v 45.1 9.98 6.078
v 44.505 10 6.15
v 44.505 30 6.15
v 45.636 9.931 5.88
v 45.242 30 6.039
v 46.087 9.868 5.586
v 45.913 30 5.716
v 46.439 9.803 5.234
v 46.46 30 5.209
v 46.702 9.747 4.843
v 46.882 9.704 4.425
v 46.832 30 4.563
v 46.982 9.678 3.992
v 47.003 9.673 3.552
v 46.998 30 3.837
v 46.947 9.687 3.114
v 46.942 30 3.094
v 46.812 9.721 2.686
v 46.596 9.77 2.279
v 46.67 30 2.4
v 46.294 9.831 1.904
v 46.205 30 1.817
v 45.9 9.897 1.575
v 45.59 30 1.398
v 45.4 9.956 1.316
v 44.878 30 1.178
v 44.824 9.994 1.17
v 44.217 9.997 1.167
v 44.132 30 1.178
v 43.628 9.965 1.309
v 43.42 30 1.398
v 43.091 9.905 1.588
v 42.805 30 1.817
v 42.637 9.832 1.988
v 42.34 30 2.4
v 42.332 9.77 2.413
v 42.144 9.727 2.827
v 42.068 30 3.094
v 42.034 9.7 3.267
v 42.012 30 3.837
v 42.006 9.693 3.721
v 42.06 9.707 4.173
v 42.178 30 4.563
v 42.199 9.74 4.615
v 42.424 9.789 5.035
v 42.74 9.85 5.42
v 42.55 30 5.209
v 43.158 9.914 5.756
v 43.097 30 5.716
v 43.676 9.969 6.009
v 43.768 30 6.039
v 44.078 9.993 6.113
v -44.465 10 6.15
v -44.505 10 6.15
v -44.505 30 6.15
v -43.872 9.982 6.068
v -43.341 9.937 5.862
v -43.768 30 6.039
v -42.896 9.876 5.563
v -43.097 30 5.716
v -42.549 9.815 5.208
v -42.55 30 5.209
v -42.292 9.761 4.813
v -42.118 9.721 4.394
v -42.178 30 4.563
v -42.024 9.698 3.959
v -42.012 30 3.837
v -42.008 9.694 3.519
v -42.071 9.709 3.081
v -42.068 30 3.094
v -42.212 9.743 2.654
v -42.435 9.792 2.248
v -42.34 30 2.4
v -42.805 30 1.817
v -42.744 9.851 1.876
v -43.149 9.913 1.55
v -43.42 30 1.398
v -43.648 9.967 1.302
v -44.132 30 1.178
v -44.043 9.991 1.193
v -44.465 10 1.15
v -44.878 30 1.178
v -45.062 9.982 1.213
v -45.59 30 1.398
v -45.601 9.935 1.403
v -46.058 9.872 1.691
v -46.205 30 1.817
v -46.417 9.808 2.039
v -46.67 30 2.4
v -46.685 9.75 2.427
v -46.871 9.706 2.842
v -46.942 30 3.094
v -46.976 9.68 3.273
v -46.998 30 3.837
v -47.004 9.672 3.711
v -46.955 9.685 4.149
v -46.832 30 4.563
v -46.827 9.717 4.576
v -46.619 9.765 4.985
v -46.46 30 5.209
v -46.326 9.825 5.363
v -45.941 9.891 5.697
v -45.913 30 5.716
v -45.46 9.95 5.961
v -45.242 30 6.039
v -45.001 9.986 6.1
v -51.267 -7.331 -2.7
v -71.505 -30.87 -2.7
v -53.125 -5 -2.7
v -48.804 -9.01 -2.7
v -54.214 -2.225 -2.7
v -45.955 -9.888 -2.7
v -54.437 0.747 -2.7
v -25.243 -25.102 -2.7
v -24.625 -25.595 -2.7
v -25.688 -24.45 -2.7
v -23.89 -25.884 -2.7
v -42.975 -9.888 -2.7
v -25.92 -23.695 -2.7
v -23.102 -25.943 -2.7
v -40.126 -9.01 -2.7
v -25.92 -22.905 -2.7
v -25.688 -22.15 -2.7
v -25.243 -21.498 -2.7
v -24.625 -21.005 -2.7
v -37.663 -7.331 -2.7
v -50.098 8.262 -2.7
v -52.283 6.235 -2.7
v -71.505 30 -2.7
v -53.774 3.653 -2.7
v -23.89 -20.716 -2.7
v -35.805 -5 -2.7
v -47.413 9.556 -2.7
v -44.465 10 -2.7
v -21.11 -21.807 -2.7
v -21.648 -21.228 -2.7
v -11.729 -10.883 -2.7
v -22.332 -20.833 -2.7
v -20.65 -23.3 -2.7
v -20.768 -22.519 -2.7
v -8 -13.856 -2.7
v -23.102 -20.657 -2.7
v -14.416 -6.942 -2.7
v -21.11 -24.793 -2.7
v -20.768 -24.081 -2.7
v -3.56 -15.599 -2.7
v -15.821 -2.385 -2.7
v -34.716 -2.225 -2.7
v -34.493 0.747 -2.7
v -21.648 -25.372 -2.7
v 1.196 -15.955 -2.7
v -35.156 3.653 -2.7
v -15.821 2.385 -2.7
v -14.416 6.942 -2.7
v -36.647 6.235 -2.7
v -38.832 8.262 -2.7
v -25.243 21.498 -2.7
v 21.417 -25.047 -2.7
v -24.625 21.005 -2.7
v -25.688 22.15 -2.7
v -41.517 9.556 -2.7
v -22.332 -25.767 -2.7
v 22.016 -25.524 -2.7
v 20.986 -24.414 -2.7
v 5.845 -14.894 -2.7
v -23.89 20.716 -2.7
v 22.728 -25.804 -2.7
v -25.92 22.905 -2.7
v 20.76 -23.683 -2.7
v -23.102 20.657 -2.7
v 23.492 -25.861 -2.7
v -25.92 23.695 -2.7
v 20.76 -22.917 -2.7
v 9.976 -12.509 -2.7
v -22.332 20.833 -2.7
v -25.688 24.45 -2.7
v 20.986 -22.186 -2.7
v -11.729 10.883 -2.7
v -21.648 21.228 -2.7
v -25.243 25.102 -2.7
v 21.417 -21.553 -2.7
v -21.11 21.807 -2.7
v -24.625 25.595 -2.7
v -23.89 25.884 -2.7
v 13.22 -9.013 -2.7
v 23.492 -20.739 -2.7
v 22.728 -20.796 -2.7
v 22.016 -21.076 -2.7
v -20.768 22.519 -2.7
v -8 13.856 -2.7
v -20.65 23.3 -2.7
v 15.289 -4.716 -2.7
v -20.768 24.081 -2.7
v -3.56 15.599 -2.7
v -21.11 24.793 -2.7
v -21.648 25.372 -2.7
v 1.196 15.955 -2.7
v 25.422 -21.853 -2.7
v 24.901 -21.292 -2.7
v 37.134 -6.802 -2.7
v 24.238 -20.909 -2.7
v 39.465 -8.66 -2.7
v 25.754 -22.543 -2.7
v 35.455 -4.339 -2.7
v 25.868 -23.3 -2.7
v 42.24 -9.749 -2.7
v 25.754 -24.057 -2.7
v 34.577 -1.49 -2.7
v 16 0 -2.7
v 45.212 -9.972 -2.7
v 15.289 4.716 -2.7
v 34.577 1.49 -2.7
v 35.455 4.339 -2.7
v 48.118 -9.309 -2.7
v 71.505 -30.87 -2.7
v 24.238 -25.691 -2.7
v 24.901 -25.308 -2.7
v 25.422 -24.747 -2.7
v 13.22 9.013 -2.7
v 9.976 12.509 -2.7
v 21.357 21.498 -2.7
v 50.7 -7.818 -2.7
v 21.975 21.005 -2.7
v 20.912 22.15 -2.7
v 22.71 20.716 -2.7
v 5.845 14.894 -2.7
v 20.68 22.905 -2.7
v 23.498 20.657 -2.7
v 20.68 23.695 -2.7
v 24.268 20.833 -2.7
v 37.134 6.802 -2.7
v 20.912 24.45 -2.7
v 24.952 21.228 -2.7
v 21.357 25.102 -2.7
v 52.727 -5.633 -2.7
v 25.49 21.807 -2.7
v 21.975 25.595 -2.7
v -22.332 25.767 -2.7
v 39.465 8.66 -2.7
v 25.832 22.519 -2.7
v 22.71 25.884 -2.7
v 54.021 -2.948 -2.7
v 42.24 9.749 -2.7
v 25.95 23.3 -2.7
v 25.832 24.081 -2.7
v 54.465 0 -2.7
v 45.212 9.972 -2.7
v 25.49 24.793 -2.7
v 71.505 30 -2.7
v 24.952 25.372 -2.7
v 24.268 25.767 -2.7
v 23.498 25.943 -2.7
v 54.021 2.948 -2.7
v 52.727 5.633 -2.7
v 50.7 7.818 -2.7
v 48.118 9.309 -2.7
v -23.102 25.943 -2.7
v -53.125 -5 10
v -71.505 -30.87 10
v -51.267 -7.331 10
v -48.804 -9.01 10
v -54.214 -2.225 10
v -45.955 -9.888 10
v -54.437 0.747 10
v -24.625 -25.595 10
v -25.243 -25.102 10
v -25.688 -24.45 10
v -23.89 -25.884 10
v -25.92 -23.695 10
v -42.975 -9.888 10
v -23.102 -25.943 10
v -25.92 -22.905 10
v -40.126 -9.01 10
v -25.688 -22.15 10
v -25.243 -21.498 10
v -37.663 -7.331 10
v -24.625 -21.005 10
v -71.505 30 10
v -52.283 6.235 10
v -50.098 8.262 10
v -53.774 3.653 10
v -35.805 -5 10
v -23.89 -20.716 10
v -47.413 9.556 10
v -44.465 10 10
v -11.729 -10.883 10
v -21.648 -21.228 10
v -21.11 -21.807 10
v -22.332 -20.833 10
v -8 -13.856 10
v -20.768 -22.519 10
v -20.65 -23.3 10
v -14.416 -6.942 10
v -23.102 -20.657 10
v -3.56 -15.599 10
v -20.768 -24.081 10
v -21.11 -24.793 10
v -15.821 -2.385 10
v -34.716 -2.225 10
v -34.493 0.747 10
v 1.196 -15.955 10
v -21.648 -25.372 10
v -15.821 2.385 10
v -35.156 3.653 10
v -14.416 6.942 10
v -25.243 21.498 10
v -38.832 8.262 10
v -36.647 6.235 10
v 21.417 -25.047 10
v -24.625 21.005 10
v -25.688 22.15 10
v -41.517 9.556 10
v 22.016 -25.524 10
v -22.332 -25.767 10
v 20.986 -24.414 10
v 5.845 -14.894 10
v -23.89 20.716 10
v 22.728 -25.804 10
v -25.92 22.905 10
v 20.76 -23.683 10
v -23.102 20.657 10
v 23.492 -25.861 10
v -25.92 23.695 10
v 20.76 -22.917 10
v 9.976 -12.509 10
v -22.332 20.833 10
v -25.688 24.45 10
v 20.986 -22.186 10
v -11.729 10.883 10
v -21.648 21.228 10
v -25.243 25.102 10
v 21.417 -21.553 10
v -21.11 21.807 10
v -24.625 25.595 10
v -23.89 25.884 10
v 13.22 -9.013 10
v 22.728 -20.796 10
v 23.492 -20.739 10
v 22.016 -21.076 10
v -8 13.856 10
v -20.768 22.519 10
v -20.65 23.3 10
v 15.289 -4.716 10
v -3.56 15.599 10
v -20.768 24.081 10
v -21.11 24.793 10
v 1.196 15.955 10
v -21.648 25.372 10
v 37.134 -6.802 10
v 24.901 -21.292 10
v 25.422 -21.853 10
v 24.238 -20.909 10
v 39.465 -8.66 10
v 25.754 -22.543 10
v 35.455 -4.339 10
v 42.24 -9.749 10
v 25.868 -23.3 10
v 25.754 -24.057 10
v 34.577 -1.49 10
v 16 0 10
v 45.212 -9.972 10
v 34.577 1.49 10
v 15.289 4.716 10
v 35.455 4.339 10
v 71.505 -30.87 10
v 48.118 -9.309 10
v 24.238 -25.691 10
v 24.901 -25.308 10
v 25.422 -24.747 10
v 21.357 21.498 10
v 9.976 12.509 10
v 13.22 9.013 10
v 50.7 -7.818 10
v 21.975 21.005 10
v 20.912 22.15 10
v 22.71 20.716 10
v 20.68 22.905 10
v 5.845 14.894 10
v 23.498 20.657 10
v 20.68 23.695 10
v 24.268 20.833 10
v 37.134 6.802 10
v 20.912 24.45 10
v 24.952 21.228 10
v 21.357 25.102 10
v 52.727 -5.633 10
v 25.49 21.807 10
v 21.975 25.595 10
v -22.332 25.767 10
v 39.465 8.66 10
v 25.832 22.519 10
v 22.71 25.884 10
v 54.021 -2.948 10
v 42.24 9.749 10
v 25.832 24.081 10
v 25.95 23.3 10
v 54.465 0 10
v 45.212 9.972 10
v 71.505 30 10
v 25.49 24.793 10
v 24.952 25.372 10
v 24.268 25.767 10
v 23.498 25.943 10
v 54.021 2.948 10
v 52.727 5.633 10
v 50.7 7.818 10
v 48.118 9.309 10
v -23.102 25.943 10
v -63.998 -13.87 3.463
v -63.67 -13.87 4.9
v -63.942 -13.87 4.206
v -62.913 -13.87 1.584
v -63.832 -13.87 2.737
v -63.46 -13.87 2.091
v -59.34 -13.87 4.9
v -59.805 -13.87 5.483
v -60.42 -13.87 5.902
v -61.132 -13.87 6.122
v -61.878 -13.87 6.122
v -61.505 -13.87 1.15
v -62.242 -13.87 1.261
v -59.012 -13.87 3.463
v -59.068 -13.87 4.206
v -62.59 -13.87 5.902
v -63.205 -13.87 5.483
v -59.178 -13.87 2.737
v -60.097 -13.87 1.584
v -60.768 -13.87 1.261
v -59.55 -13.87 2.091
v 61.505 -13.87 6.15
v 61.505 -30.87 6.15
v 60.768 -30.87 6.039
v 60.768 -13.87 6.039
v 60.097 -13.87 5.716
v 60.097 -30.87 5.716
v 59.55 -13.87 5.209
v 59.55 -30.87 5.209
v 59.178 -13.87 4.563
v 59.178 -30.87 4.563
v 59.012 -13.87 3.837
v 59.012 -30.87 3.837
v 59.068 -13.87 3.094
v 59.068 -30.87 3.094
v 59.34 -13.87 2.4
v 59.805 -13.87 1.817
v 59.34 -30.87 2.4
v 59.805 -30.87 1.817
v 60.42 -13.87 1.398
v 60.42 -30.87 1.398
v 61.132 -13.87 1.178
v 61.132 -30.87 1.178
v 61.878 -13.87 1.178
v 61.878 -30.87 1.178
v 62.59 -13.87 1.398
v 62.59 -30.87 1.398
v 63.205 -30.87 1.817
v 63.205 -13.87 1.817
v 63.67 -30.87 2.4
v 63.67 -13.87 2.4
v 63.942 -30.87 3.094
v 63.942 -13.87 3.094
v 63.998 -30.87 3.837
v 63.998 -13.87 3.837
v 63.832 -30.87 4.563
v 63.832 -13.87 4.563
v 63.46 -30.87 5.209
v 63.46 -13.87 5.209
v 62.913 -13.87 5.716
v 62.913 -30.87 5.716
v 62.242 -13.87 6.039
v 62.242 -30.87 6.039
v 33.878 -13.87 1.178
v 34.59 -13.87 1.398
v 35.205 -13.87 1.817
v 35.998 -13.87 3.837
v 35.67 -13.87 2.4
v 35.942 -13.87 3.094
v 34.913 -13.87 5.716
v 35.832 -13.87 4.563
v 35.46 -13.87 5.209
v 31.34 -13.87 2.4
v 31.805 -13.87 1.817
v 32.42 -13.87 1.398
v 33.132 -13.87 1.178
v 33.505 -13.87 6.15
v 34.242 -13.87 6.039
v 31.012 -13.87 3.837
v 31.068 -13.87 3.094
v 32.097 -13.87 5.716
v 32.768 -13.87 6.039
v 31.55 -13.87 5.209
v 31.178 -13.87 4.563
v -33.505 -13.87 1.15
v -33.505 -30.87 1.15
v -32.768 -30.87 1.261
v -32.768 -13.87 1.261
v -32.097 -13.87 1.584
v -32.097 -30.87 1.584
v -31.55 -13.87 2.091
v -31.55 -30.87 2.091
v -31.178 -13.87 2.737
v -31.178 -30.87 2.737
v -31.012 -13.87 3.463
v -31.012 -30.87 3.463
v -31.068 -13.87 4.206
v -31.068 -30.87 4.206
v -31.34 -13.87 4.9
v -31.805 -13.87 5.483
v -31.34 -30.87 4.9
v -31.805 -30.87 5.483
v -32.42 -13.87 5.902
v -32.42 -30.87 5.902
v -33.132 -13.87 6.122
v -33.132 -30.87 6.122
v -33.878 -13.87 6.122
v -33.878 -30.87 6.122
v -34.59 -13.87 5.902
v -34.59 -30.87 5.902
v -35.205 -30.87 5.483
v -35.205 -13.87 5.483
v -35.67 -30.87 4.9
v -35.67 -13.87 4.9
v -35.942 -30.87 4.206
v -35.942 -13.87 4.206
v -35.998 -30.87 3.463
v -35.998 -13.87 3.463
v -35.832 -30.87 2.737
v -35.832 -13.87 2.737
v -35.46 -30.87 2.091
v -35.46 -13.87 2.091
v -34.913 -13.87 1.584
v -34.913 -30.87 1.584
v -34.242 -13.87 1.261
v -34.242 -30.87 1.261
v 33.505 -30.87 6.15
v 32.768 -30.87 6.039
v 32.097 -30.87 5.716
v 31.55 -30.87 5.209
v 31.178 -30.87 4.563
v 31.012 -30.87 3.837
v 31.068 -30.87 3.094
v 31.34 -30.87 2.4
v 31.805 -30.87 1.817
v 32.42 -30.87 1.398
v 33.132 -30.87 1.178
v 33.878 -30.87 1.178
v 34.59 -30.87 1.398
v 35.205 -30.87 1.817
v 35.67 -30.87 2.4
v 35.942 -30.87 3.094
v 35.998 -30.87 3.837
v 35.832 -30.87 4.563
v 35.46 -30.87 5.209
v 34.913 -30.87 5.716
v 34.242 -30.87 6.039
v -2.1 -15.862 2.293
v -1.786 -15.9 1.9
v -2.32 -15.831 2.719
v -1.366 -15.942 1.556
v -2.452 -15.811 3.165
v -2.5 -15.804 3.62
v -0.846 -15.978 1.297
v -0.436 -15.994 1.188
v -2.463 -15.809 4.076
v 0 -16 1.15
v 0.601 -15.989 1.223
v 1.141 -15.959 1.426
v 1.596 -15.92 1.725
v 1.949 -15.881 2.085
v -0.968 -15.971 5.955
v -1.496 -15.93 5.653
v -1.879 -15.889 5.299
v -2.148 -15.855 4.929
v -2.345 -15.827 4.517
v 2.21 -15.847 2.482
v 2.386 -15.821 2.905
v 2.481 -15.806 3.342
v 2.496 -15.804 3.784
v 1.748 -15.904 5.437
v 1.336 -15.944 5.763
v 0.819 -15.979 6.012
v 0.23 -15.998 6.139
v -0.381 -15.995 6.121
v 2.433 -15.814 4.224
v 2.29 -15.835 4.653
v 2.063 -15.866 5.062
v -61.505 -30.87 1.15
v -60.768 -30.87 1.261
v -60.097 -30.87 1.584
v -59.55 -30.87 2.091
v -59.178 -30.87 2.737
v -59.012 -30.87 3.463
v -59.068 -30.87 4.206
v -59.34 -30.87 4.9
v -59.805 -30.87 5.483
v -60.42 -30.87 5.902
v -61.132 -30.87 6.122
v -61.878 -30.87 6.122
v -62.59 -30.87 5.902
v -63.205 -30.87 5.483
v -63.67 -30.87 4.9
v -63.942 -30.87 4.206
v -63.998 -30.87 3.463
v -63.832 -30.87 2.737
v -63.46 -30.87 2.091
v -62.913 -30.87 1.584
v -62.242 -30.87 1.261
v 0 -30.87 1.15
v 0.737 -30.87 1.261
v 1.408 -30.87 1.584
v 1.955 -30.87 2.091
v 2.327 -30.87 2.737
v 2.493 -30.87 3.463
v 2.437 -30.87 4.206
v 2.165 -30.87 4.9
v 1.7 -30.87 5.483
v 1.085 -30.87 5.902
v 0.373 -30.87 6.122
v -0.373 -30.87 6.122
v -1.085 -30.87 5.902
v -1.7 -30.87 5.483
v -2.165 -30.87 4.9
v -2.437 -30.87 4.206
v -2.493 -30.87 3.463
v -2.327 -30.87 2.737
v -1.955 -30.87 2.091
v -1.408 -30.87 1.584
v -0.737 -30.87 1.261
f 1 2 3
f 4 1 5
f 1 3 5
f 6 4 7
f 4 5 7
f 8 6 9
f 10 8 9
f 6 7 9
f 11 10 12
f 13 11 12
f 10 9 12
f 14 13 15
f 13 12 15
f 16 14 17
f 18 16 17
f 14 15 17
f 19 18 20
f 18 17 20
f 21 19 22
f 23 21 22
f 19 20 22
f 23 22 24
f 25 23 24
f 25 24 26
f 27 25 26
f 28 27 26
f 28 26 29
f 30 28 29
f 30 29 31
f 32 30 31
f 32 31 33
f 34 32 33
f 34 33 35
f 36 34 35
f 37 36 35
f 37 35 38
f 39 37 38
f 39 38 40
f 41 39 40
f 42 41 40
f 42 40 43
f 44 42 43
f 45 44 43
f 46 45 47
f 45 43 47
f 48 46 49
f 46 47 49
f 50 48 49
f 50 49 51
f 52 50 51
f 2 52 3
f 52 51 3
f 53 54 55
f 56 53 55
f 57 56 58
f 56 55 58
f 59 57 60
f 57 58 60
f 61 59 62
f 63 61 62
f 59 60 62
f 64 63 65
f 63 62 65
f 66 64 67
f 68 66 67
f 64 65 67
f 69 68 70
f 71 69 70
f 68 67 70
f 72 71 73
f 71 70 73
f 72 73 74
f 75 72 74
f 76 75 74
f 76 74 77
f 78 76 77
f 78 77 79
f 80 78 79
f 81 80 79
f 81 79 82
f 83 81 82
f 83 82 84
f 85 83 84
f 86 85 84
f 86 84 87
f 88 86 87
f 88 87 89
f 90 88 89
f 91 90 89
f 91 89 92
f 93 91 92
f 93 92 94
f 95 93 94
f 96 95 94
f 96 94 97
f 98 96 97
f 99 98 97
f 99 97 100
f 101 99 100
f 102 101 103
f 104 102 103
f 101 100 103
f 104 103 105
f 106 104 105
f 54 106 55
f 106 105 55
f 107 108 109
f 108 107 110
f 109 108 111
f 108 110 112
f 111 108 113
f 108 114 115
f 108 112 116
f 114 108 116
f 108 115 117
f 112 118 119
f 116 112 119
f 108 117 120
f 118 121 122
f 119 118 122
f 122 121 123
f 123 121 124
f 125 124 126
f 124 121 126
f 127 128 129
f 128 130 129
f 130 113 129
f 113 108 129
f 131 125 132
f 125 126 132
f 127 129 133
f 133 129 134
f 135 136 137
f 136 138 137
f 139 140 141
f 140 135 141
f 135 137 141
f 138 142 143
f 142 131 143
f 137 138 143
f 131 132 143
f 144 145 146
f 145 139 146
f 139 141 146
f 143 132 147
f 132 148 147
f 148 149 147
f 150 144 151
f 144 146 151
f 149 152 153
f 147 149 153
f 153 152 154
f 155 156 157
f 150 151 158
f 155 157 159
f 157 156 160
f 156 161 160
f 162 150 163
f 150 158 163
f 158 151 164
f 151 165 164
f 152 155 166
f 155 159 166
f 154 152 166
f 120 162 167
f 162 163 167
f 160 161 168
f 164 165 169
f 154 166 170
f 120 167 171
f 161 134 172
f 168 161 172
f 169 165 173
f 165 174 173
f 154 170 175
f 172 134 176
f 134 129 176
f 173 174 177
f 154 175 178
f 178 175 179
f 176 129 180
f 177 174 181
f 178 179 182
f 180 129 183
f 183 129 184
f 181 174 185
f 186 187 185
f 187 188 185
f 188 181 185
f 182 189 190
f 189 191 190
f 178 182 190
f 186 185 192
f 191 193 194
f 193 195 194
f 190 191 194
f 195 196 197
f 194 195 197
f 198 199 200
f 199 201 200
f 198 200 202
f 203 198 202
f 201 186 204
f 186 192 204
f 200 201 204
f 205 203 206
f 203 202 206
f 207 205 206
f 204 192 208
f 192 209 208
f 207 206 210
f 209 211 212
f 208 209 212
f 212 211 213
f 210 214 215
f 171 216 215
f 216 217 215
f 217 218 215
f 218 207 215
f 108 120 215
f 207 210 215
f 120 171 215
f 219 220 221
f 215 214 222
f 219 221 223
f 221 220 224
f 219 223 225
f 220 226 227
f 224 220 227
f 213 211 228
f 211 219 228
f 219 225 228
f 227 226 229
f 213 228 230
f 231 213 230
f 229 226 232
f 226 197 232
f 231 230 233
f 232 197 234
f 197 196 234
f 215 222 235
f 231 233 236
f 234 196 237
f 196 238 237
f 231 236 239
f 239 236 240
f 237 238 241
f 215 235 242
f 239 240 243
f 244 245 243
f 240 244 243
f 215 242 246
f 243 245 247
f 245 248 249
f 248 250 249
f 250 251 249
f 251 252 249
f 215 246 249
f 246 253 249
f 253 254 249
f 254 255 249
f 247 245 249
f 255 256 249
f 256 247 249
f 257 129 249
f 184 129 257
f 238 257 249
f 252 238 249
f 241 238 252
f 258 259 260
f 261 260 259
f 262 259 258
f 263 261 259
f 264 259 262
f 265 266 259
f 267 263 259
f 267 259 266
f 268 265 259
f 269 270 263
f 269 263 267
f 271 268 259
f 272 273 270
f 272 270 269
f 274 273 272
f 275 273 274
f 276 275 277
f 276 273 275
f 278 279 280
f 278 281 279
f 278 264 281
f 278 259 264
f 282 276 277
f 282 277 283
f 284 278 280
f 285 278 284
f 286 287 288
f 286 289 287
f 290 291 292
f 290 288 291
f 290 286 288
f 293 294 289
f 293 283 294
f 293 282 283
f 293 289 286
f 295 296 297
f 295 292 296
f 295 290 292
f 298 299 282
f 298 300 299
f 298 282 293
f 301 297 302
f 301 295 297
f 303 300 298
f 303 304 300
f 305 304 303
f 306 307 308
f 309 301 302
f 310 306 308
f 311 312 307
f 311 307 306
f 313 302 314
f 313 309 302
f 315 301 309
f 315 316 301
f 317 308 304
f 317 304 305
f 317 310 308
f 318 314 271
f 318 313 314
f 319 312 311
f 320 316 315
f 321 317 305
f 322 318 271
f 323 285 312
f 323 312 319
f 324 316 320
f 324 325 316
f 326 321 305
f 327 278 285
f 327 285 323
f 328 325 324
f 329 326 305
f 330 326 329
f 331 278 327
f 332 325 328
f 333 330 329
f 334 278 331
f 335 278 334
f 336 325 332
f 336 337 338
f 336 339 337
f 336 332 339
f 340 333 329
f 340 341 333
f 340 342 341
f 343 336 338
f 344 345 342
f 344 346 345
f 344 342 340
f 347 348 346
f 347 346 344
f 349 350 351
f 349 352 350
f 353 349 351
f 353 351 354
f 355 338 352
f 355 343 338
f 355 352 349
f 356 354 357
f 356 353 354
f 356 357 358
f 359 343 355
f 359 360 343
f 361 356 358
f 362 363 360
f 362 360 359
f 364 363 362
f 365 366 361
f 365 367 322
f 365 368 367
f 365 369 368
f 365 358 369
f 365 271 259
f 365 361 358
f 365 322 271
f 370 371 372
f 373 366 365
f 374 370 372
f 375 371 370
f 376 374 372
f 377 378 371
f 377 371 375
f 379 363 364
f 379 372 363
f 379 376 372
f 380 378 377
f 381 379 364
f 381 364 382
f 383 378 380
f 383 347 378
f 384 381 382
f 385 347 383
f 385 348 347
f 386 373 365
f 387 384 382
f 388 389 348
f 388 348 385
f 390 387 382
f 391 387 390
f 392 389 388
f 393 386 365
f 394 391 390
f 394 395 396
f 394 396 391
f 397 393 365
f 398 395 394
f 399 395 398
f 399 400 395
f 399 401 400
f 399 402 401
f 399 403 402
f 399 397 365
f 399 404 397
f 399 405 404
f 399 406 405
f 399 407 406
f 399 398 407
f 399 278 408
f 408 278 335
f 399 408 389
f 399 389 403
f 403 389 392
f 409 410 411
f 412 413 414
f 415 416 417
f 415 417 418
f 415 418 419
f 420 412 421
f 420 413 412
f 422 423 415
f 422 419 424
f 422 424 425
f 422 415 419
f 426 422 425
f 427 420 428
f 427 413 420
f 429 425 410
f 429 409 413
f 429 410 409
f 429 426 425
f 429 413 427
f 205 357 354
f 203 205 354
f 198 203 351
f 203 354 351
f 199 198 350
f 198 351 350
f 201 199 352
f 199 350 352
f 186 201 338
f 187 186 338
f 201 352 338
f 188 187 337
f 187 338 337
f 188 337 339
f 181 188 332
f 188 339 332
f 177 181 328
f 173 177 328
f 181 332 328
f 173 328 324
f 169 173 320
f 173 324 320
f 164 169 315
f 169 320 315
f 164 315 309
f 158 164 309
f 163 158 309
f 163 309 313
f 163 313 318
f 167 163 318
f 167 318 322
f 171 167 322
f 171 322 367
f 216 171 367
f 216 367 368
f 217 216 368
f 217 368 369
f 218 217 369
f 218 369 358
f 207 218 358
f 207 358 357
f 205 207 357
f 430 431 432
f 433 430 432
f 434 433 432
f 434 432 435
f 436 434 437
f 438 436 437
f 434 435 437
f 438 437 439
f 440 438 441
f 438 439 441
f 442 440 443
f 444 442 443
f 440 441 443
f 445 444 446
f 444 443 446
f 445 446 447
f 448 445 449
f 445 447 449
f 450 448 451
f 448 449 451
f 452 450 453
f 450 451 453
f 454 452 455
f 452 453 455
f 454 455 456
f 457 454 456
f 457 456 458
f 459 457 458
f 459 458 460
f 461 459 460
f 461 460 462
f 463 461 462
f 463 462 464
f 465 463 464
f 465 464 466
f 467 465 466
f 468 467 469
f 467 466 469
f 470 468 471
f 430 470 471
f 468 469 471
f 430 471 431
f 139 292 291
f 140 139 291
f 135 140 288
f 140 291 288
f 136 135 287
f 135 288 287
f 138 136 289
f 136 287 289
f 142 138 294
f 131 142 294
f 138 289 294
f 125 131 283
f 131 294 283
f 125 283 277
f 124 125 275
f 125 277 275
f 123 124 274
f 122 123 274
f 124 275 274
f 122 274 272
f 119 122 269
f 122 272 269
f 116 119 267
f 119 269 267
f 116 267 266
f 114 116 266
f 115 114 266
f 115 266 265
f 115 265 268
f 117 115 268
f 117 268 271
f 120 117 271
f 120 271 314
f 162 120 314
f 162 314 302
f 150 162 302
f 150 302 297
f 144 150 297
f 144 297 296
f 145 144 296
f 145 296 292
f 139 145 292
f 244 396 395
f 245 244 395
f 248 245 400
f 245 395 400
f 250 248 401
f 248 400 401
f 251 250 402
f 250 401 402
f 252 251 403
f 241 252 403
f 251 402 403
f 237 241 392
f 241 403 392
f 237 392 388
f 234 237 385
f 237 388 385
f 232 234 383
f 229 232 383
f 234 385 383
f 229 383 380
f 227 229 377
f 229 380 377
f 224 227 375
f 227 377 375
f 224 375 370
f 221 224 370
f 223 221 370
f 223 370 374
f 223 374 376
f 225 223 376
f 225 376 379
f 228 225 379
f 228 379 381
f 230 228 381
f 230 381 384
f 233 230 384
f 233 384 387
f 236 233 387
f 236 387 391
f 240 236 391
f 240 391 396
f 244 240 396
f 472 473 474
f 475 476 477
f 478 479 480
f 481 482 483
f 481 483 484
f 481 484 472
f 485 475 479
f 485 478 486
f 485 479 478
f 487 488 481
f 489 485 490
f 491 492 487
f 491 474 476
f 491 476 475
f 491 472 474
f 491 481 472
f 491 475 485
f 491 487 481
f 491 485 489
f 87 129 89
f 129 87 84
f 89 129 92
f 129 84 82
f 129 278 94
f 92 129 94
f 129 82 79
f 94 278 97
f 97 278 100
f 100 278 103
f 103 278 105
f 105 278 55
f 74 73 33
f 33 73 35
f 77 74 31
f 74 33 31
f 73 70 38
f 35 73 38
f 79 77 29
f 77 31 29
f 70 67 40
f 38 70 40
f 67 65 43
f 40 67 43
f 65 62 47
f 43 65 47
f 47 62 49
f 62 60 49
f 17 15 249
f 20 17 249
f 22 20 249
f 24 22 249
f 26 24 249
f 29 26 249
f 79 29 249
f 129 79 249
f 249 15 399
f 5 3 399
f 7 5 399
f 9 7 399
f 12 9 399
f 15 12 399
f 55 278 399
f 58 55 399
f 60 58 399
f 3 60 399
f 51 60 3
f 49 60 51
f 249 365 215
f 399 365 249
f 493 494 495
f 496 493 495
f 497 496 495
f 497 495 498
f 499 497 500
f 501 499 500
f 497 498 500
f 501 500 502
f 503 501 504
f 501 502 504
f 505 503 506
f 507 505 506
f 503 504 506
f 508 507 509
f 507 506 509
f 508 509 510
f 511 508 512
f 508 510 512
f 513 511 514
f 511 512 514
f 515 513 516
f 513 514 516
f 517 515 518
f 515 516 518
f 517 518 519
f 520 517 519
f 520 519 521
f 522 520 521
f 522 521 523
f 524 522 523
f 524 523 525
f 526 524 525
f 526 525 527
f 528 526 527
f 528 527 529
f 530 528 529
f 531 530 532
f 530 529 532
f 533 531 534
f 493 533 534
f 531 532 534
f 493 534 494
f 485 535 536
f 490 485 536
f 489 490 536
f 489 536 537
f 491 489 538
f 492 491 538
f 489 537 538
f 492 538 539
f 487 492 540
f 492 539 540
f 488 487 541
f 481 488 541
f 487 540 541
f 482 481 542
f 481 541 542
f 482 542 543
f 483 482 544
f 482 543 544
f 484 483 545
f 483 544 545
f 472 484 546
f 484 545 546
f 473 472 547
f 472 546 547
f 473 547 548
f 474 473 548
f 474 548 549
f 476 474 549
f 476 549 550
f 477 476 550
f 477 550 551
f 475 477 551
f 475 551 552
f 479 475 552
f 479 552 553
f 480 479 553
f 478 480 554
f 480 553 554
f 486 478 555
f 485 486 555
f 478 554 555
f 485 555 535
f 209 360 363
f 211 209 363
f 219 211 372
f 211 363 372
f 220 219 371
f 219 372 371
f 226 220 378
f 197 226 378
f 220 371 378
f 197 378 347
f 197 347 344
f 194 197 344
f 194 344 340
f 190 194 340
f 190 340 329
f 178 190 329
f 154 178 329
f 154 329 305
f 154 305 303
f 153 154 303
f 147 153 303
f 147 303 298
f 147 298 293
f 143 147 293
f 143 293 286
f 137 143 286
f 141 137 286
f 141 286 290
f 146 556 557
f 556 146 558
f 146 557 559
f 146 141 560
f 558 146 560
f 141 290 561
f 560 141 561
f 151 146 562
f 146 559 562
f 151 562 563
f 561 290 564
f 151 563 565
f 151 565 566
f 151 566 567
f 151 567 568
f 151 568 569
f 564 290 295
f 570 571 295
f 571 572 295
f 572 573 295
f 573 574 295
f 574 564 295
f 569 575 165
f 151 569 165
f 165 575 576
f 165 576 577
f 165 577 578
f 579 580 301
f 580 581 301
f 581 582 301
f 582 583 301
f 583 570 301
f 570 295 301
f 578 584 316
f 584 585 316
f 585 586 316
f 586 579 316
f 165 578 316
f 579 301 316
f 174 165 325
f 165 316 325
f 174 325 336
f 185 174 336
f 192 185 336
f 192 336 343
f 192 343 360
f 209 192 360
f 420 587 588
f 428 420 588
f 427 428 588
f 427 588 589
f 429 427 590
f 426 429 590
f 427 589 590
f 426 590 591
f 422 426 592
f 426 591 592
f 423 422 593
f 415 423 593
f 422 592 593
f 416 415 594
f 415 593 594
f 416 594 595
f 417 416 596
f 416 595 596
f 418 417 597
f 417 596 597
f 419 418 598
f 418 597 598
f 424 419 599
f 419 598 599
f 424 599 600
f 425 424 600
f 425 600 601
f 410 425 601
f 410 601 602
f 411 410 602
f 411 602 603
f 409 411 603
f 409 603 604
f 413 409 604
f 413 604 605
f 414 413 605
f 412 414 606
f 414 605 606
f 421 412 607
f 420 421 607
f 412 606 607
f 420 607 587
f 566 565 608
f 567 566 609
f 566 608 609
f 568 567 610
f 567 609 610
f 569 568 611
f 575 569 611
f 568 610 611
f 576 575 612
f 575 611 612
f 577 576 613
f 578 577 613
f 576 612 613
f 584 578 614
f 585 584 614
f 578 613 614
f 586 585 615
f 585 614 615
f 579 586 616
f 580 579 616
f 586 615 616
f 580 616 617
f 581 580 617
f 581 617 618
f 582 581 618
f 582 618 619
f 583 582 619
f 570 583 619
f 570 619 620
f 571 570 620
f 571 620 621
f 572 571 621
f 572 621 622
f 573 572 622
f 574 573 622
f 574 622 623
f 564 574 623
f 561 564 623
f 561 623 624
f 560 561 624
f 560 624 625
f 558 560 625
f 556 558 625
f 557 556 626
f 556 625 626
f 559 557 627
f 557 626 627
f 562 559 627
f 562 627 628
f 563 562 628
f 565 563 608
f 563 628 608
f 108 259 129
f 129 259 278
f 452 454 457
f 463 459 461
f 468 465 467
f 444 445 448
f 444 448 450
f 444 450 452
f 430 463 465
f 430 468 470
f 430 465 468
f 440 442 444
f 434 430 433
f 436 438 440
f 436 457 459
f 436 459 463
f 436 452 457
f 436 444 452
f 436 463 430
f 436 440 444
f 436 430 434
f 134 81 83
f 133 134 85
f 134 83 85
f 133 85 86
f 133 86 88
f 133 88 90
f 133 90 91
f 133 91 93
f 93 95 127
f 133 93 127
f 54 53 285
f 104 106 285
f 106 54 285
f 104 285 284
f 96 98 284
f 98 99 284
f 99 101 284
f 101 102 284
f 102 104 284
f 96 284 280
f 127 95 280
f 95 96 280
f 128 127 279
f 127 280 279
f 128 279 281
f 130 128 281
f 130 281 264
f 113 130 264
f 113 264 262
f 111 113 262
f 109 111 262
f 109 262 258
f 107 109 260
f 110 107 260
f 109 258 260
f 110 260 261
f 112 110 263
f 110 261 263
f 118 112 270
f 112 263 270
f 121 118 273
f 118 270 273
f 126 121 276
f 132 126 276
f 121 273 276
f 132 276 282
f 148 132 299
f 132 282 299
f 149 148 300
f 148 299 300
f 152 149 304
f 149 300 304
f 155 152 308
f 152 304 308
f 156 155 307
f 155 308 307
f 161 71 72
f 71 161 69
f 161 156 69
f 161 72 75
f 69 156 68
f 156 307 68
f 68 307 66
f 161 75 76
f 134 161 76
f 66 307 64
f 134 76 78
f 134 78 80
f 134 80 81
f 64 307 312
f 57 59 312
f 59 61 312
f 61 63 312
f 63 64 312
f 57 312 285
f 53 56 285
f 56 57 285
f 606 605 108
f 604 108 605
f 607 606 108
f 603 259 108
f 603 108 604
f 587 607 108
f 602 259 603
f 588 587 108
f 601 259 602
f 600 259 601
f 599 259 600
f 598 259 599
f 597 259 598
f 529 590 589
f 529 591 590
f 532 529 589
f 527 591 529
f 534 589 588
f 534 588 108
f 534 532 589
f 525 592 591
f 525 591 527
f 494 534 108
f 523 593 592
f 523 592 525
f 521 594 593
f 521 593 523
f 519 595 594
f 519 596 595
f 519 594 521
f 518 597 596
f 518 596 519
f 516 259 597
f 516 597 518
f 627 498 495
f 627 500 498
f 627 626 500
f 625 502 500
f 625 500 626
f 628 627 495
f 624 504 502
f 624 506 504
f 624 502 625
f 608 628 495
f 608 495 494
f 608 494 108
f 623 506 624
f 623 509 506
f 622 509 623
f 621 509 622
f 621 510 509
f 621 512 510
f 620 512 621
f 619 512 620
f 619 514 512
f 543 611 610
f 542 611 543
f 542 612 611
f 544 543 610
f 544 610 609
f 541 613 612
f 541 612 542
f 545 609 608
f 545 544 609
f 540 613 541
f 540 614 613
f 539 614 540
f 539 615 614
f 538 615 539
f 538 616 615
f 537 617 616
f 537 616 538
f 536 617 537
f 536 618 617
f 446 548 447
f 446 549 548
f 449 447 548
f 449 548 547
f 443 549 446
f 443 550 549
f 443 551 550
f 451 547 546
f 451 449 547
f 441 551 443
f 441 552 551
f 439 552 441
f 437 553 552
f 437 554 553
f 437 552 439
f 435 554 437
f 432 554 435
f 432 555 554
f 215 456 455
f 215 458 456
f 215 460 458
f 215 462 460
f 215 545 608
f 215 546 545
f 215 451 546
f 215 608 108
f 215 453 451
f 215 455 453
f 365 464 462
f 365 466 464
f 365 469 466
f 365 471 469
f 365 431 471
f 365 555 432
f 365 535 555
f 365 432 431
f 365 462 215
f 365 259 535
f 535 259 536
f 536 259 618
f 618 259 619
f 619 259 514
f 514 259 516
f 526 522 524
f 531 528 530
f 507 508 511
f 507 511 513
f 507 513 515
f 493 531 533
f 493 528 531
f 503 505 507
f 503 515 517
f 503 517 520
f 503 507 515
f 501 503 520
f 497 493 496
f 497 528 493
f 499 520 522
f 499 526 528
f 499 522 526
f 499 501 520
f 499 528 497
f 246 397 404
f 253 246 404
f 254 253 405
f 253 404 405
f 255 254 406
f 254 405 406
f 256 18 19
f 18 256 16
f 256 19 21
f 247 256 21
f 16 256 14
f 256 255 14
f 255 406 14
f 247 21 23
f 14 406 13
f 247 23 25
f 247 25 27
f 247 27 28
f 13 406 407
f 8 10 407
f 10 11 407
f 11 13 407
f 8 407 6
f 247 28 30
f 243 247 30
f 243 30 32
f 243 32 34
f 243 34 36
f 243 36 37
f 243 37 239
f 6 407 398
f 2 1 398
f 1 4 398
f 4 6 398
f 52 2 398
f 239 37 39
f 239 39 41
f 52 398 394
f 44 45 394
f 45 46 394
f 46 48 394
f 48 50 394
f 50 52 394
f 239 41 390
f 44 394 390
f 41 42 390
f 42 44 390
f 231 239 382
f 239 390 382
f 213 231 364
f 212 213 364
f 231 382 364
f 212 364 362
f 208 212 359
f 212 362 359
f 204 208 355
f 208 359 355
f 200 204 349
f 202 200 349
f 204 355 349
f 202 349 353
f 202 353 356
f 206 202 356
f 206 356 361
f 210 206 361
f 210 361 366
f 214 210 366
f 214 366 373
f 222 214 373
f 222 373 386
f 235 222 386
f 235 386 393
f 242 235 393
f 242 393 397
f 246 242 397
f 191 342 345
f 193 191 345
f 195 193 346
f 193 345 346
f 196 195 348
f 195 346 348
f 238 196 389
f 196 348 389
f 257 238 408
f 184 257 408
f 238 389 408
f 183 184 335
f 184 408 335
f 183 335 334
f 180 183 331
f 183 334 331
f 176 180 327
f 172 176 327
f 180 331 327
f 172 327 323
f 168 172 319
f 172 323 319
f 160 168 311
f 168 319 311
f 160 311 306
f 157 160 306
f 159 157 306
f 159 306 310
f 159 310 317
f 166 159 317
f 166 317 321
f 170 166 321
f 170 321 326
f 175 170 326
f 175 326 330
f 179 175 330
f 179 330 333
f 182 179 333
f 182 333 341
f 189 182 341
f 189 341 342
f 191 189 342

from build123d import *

# Parameters (mm, degrees)
ESBO_O1_W                = 143.01
ESBO_O1_H                = 54
RESSALTO_EXTRUS_O1_DEPTH = 10
ESBO_O14_W               = 2.7
ESBO_O14_H               = 57.87
RESSALTO_EXTRUS_O3_DEPTH = 143.01
ESBO_O2_R                = 16
CIRCULO_ROLAMENTO_DEPTH  = 19
ESBO_O7_R                = 10
CORTE_EXTRUS_O3_DEPTH    = 19
ESBO_O8_W                = 143.01
ESBO_O8_H                = 3.87
RESSALTO_EXTRUS_O2_DEPTH = 10
ESBO_O22_W               = 143.01
ESBO_O22_H               = 3
RESSALTO_EXTRUS_O4_DEPTH = 12.7
ESBO_O12_R               = 2.5
CORTE_EXTRUS_O6_DEPTH    = 17
CORTE_EXTRUS_O15_REACH   = 80.913
ESBO_O9_R                = 2.568489929
ESBO_O9_R_2              = 2.65
CORTE_EXTRUS_O16_REACH   = 96.436
ESBO_O23_R               = 2.5


with BuildPart() as part:
    # Esboço1 → Ressalto-extrusão1 (new body)
    with BuildSketch(Plane.XY):
        Rectangle(ESBO_O1_W, ESBO_O1_H)
    extrude(amount=RESSALTO_EXTRUS_O1_DEPTH)

    # Esboço14 → Ressalto-extrusão3 (add)
    with BuildSketch(Plane.ZY.offset(71.505)):
        with Locations((-1.35, -1.935)):
            Rectangle(ESBO_O14_W, ESBO_O14_H)
    extrude(amount=-RESSALTO_EXTRUS_O3_DEPTH)

    # Esboço2 → Circulo rolamento (cut)
    with BuildSketch(Plane.XY.offset(10)):
        Circle(ESBO_O2_R)
    extrude(amount=-CIRCULO_ROLAMENTO_DEPTH, mode=Mode.SUBTRACT)

    # Esboço7 → Corte-extrusão3 (cut)
    with BuildSketch(Plane.XY.offset(10)):
        with Locations(Location((-44.465, 0, 0), (0, 0, 90))):
            Circle(ESBO_O7_R)
        with Locations((44.465, 0)):
            Circle(ESBO_O7_R)
    extrude(amount=-CORTE_EXTRUS_O3_DEPTH, mode=Mode.SUBTRACT)

    # Esboço8 → Ressalto-extrusão2 (add)
    with BuildSketch(Plane.XY.offset(10)):
        with Locations((0, -28.935)):
            Rectangle(ESBO_O8_W, ESBO_O8_H)
    extrude(amount=-RESSALTO_EXTRUS_O2_DEPTH)

    # Esboço22 → Ressalto-extrusão4 (add)
    with BuildSketch(Plane.XY.offset(10)):
        with Locations((0, 28.5)):
            Rectangle(ESBO_O22_W, ESBO_O22_H)
    extrude(amount=-RESSALTO_EXTRUS_O4_DEPTH)

    # Esboço12 → Corte-extrusão6 (cut)
    with BuildSketch(Plane.XZ.offset(30.87)):
        with Locations(Location((-61.505, 3.65, 0), (0, 0, 270))):
            Circle(ESBO_O12_R)
        with Locations(Location((33.505, 3.65, 0), (0, 0, 90))):
            Circle(ESBO_O12_R)
        with Locations(Location((0, 3.65, 0), (0, 0, 270))):
            Circle(ESBO_O12_R)
        with Locations(Location((-33.505, 3.65, 0), (0, 0, 270))):
            Circle(ESBO_O12_R)
        with Locations(Location((61.505, 3.65, 0), (0, 0, 90))):
            Circle(ESBO_O12_R)
    extrude(amount=-CORTE_EXTRUS_O6_DEPTH, mode=Mode.SUBTRACT)

    # Esboço9 → Corte-extrusão15 (cut, up to next)
    with BuildSketch(Plane.XY.offset(10), mode=Mode.PRIVATE) as corte_extrus_o15_sk1:
        with Locations((23.3, -23.3)):
            Circle(ESBO_O9_R)
    corte_extrus_o15_tool1 = extrude(corte_extrus_o15_sk1.sketch, amount=-CORTE_EXTRUS_O15_REACH, mode=Mode.PRIVATE) & part.part
    # Esboço9 → Corte-extrusão15 (cut, up to next)
    with BuildSketch(Plane.XY.offset(10), mode=Mode.PRIVATE) as corte_extrus_o15_sk2:
        with Locations((23.3, 23.3)):
            Circle(ESBO_O9_R_2)
    corte_extrus_o15_tool2 = extrude(corte_extrus_o15_sk2.sketch, amount=-CORTE_EXTRUS_O15_REACH, mode=Mode.PRIVATE) & part.part
    # Esboço9 → Corte-extrusão15 (cut, up to next)
    with BuildSketch(Plane.XY.offset(10), mode=Mode.PRIVATE) as corte_extrus_o15_sk3:
        with Locations((-23.3, -23.3)):
            Circle(ESBO_O9_R_2)
    corte_extrus_o15_tool3 = extrude(corte_extrus_o15_sk3.sketch, amount=-CORTE_EXTRUS_O15_REACH, mode=Mode.PRIVATE) & part.part
    # Esboço9 → Corte-extrusão15 (cut, up to next)
    with BuildSketch(Plane.XY.offset(10), mode=Mode.PRIVATE) as corte_extrus_o15_sk4:
        with Locations((-23.3, 23.3)):
            Circle(ESBO_O9_R_2)
    corte_extrus_o15_tool4 = extrude(corte_extrus_o15_sk4.sketch, amount=-CORTE_EXTRUS_O15_REACH, mode=Mode.PRIVATE) & part.part
    add(corte_extrus_o15_tool1.solids().sort_by_distance((23.3, -23.3, 10))[0], mode=Mode.SUBTRACT)
    add(corte_extrus_o15_tool2.solids().sort_by_distance((23.3, 23.3, 10))[0], mode=Mode.SUBTRACT)
    add(corte_extrus_o15_tool3.solids().sort_by_distance((-23.3, -23.3, 10))[0], mode=Mode.SUBTRACT)
    add(corte_extrus_o15_tool4.solids().sort_by_distance((-23.3, 23.3, 10))[0], mode=Mode.SUBTRACT)

    # Esboço23 → Corte-extrusão16 (cut, up to next)
    with BuildSketch(Plane(origin=(0, 30, 0), x_dir=(1, 0, 0), z_dir=(0, 1, 0)), mode=Mode.PRIVATE) as corte_extrus_o16_sk1:
        with Locations(Location((-44.505, -3.65, 0), (0, 0, 270))):
            Circle(ESBO_O23_R)
    corte_extrus_o16_tool1 = extrude(corte_extrus_o16_sk1.sketch, amount=-CORTE_EXTRUS_O16_REACH, mode=Mode.PRIVATE) & part.part
    # Esboço23 → Corte-extrusão16 (cut, up to next)
    with BuildSketch(Plane(origin=(0, 30, 0), x_dir=(1, 0, 0), z_dir=(0, 1, 0)), mode=Mode.PRIVATE) as corte_extrus_o16_sk2:
        with Locations(Location((44.505, -3.65, 0), (0, 0, 270))):
            Circle(ESBO_O23_R)
    corte_extrus_o16_tool2 = extrude(corte_extrus_o16_sk2.sketch, amount=-CORTE_EXTRUS_O16_REACH, mode=Mode.PRIVATE) & part.part
    add(corte_extrus_o16_tool1.solids().sort_by_distance((-44.505, 30, 3.65))[0], mode=Mode.SUBTRACT)
    add(corte_extrus_o16_tool2.solids().sort_by_distance((44.505, 30, 3.65))[0], mode=Mode.SUBTRACT)


solid = part.part
